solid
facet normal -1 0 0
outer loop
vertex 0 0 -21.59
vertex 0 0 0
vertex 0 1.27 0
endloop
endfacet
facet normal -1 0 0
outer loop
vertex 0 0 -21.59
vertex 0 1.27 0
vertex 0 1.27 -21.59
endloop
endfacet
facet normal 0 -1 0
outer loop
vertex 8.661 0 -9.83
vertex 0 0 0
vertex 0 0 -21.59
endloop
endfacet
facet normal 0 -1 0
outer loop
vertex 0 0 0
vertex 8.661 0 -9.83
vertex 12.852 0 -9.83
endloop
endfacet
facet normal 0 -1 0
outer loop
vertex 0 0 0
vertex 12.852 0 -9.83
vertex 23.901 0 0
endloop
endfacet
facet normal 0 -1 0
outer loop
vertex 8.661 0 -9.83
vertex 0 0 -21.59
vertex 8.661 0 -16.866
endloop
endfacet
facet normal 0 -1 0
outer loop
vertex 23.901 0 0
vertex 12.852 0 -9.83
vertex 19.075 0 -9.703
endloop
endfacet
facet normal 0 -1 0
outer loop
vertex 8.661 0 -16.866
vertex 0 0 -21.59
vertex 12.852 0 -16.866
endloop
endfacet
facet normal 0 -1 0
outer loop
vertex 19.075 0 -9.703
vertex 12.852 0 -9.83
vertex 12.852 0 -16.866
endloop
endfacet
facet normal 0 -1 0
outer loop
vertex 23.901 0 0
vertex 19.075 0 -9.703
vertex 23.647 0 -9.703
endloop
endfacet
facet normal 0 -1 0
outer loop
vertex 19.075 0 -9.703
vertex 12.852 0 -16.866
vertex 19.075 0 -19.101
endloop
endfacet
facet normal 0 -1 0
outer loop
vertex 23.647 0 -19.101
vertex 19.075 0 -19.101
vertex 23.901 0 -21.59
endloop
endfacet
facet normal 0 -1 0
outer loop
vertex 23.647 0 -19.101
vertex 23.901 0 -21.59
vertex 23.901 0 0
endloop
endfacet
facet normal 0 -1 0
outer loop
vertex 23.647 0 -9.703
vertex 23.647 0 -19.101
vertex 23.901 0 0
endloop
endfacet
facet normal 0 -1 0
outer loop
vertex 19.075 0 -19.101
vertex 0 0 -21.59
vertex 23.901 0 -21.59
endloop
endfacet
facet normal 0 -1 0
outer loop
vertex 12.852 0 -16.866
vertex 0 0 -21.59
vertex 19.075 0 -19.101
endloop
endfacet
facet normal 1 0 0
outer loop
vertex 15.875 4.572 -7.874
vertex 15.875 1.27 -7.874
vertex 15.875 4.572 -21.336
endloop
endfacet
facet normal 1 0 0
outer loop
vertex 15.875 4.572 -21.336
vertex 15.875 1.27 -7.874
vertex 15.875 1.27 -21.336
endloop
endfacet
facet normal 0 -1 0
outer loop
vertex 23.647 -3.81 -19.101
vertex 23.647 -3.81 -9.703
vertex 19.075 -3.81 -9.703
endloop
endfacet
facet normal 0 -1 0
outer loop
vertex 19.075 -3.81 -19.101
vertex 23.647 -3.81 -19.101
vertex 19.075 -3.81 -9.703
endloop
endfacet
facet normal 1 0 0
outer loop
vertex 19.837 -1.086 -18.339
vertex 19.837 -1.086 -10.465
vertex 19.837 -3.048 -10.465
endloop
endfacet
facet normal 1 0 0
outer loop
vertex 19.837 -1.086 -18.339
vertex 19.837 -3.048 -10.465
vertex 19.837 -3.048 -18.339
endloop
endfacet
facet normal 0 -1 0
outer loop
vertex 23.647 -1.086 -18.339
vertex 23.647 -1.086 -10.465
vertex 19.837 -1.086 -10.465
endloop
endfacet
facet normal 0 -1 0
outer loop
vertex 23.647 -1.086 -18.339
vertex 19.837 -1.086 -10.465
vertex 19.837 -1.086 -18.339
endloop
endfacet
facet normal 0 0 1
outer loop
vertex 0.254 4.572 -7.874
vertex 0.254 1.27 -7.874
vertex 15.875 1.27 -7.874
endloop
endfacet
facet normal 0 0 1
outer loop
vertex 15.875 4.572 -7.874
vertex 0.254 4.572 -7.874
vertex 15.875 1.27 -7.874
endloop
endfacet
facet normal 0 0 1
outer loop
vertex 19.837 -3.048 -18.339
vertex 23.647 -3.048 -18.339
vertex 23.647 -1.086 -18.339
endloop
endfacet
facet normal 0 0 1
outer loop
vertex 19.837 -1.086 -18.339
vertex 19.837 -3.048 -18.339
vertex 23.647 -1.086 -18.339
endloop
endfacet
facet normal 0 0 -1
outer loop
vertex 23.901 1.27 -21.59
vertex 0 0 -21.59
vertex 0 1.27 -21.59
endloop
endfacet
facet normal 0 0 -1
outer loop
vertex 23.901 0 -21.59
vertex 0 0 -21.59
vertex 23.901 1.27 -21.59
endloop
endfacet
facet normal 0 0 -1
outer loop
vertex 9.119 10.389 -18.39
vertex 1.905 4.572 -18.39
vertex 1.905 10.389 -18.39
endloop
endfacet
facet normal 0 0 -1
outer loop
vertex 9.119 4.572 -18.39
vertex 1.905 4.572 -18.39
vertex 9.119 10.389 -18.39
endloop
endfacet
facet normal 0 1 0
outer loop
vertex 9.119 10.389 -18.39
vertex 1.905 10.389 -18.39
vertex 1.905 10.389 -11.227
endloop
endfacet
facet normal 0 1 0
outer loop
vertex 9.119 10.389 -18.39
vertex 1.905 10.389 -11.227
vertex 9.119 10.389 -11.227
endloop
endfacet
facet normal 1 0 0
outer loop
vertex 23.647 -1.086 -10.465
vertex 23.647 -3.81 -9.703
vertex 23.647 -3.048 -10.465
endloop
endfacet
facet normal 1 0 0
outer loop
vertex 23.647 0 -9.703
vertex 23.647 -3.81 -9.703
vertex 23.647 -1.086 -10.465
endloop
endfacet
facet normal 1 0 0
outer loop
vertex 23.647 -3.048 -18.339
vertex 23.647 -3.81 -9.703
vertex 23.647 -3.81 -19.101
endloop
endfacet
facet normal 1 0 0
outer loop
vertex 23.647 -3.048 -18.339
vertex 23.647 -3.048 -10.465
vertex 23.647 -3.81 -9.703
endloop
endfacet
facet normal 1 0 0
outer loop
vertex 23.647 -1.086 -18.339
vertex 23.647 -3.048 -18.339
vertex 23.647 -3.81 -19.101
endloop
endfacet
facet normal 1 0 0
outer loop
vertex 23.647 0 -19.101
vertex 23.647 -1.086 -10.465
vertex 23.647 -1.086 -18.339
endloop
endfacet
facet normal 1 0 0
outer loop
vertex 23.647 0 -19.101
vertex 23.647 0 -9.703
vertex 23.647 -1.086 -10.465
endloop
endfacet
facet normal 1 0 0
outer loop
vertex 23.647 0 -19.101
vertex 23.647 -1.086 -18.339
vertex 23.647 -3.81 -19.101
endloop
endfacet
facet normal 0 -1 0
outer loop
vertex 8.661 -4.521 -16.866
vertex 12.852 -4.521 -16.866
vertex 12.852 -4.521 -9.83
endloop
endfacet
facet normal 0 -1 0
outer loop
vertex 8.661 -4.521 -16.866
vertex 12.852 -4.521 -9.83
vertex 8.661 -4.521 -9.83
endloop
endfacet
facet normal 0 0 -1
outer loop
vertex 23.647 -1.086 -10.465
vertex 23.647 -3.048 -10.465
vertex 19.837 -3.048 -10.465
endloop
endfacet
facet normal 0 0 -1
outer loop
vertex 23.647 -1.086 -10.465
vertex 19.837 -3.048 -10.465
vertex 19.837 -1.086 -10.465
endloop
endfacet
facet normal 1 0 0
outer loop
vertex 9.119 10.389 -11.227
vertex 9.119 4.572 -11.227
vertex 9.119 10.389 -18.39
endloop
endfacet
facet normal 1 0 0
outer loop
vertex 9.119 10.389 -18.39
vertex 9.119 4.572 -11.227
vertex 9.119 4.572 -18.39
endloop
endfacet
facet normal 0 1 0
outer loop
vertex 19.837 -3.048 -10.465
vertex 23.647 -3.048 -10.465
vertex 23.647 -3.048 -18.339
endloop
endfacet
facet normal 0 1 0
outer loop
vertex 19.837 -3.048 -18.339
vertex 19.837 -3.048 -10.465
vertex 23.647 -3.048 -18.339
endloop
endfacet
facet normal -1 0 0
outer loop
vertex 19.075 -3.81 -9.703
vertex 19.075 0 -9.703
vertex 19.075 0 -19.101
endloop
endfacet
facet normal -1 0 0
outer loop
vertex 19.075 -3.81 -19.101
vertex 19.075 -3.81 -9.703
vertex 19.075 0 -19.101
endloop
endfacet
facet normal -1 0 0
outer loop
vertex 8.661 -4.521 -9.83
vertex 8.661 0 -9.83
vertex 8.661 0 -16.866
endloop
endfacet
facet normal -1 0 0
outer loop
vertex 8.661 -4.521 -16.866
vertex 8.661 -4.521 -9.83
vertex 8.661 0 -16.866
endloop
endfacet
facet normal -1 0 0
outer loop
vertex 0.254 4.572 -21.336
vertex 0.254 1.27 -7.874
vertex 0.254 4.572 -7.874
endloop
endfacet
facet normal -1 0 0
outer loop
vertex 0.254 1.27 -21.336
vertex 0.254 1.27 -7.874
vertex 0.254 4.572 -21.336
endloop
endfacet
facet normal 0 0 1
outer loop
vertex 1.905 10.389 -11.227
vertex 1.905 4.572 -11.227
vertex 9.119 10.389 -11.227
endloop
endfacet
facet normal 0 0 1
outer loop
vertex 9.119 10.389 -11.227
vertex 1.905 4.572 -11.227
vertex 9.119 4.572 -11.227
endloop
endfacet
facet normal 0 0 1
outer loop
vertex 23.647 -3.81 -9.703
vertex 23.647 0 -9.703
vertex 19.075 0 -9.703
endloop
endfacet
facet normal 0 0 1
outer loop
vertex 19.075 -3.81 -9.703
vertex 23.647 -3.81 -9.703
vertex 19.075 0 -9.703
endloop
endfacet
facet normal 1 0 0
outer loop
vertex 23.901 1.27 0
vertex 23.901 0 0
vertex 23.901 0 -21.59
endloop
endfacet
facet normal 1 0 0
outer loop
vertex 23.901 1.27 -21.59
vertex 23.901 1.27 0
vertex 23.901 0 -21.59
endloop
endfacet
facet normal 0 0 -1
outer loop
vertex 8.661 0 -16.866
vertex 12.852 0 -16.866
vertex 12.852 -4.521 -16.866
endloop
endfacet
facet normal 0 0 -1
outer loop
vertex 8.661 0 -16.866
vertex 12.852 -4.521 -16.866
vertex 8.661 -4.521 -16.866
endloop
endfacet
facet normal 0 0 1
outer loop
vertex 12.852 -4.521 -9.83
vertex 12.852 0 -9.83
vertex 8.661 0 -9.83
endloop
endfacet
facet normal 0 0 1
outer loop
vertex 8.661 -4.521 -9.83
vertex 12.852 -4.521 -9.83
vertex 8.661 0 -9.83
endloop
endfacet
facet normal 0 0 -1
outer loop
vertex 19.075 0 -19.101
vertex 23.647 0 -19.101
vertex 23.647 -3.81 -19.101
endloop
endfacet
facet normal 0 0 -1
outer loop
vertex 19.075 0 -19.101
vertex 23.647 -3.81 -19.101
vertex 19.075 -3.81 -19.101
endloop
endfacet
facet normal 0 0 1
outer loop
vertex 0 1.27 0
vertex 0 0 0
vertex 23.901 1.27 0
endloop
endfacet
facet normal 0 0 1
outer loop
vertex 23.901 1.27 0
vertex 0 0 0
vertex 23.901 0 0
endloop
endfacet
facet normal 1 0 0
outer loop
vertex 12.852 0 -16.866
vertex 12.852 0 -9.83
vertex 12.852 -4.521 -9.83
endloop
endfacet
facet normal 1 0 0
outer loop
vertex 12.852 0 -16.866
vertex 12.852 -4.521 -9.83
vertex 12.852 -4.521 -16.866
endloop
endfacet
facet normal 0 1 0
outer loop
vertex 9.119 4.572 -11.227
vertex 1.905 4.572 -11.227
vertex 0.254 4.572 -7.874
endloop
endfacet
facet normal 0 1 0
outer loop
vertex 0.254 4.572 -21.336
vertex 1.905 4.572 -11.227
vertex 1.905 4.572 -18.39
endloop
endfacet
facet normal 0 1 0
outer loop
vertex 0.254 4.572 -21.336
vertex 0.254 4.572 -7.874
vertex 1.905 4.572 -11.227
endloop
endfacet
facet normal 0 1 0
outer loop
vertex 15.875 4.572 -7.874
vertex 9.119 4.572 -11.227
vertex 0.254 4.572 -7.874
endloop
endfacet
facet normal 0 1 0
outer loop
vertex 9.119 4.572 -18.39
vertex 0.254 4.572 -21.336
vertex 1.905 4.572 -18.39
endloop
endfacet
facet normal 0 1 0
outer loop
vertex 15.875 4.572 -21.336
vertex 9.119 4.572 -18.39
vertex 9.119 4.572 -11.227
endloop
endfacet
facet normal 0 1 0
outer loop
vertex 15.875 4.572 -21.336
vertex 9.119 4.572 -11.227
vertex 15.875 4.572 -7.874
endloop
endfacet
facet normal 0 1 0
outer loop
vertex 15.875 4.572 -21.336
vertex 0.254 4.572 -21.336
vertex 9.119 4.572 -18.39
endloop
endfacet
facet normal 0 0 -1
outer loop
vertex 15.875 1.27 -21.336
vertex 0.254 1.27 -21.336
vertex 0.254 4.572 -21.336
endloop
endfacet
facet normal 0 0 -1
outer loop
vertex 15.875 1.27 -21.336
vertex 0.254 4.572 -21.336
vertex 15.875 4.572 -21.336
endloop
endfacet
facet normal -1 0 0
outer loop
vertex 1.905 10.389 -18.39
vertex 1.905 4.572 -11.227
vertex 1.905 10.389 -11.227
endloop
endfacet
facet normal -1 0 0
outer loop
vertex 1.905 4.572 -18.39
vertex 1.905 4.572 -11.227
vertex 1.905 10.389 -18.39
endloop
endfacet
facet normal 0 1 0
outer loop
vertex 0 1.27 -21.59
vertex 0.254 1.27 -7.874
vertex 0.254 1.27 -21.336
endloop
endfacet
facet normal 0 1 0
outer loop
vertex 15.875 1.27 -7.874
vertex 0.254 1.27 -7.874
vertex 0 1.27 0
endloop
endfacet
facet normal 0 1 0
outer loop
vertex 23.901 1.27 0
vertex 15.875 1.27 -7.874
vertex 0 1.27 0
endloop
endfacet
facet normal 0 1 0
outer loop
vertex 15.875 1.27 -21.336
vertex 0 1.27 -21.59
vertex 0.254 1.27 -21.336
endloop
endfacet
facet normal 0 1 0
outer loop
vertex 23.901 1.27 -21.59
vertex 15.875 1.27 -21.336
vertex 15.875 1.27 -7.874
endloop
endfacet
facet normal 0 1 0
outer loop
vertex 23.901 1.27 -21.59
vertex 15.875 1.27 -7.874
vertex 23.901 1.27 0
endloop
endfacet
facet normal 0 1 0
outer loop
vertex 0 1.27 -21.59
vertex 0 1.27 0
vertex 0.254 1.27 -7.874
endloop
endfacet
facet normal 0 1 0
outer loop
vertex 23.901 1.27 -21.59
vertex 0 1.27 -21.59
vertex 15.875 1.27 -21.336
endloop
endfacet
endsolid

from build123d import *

# Parameters (mm, degrees)
SKETCH1_W           = 23.9014
SKETCH1_H           = 21.59
BOSS_EXTRUDE1_DEPTH = 1.27
SKETCH2_W           = 15.621
SKETCH2_H           = 13.462
BOSS_EXTRUDE2_DEPTH = 3.302
SKETCH3_W           = 7.2136
SKETCH3_H           = 7.1628
BOSS_EXTRUDE3_DEPTH = 5.8166
SKETCH4_W           = 4.191
SKETCH4_H           = 7.0358
BOSS_EXTRUDE4_DEPTH = 4.5212
SKETCH5_W           = 4.572
SKETCH5_H           = 9.398
BOSS_EXTRUDE5_DEPTH = 3.81
SKETCH6_W           = 7.874
SKETCH6_H           = 1.961854403
CUT_EXTRUDE1_DEPTH  = 3.81


with BuildPart() as part:
    # Sketch1 → Boss-Extrude1 (new body)
    with BuildSketch(Plane(origin=(0, 0, 0), x_dir=(1, 0, 0), z_dir=(0, 1, 0))):
        with Locations((11.9507, 10.795)):
            Rectangle(SKETCH1_W, SKETCH1_H)
    extrude(amount=BOSS_EXTRUDE1_DEPTH)

    # Sketch2 → Boss-Extrude2 (add)
    with BuildSketch(Plane(origin=(0, 1.27, 0), x_dir=(1, 0, 0), z_dir=(0, 1, 0))):
        with Locations((8.0645, 14.605)):
            Rectangle(SKETCH2_W, SKETCH2_H)
    extrude(amount=BOSS_EXTRUDE2_DEPTH)

    # Sketch3 → Boss-Extrude3 (add)
    with BuildSketch(Plane(origin=(0, 4.572, 0), x_dir=(1, 0, 0), z_dir=(0, 1, 0))):
        with Locations((5.5118, 14.8082)):
            Rectangle(SKETCH3_W, SKETCH3_H)
    extrude(amount=BOSS_EXTRUDE3_DEPTH)

    # Sketch4 → Boss-Extrude4 (add)
    with BuildSketch(Plane(origin=(0, 0, 0), x_dir=(-1, 0, 0), z_dir=(0, -1, 0))):
        with Locations((-10.7569, 13.3477)):
            Rectangle(SKETCH4_W, SKETCH4_H)
    extrude(amount=BOSS_EXTRUDE4_DEPTH)

    # Sketch5 → Boss-Extrude5 (add)
    with BuildSketch(Plane(origin=(0, 0, 0), x_dir=(-1, 0, 0), z_dir=(0, -1, 0))):
        with Locations((-21.3614, 14.4018)):
            Rectangle(SKETCH5_W, SKETCH5_H)
    extrude(amount=BOSS_EXTRUDE5_DEPTH)

    # Sketch6 → Cut-Extrude1 (cut)
    with BuildSketch(Plane(origin=(23.6474, 0, 0), x_dir=(0, 0, -1), z_dir=(1, 0, 0))):
        with Locations((14.4018, -2.067072798)):
            Rectangle(SKETCH6_W, SKETCH6_H)
    extrude(amount=-CUT_EXTRUDE1_DEPTH, mode=Mode.SUBTRACT)


solid = part.part
